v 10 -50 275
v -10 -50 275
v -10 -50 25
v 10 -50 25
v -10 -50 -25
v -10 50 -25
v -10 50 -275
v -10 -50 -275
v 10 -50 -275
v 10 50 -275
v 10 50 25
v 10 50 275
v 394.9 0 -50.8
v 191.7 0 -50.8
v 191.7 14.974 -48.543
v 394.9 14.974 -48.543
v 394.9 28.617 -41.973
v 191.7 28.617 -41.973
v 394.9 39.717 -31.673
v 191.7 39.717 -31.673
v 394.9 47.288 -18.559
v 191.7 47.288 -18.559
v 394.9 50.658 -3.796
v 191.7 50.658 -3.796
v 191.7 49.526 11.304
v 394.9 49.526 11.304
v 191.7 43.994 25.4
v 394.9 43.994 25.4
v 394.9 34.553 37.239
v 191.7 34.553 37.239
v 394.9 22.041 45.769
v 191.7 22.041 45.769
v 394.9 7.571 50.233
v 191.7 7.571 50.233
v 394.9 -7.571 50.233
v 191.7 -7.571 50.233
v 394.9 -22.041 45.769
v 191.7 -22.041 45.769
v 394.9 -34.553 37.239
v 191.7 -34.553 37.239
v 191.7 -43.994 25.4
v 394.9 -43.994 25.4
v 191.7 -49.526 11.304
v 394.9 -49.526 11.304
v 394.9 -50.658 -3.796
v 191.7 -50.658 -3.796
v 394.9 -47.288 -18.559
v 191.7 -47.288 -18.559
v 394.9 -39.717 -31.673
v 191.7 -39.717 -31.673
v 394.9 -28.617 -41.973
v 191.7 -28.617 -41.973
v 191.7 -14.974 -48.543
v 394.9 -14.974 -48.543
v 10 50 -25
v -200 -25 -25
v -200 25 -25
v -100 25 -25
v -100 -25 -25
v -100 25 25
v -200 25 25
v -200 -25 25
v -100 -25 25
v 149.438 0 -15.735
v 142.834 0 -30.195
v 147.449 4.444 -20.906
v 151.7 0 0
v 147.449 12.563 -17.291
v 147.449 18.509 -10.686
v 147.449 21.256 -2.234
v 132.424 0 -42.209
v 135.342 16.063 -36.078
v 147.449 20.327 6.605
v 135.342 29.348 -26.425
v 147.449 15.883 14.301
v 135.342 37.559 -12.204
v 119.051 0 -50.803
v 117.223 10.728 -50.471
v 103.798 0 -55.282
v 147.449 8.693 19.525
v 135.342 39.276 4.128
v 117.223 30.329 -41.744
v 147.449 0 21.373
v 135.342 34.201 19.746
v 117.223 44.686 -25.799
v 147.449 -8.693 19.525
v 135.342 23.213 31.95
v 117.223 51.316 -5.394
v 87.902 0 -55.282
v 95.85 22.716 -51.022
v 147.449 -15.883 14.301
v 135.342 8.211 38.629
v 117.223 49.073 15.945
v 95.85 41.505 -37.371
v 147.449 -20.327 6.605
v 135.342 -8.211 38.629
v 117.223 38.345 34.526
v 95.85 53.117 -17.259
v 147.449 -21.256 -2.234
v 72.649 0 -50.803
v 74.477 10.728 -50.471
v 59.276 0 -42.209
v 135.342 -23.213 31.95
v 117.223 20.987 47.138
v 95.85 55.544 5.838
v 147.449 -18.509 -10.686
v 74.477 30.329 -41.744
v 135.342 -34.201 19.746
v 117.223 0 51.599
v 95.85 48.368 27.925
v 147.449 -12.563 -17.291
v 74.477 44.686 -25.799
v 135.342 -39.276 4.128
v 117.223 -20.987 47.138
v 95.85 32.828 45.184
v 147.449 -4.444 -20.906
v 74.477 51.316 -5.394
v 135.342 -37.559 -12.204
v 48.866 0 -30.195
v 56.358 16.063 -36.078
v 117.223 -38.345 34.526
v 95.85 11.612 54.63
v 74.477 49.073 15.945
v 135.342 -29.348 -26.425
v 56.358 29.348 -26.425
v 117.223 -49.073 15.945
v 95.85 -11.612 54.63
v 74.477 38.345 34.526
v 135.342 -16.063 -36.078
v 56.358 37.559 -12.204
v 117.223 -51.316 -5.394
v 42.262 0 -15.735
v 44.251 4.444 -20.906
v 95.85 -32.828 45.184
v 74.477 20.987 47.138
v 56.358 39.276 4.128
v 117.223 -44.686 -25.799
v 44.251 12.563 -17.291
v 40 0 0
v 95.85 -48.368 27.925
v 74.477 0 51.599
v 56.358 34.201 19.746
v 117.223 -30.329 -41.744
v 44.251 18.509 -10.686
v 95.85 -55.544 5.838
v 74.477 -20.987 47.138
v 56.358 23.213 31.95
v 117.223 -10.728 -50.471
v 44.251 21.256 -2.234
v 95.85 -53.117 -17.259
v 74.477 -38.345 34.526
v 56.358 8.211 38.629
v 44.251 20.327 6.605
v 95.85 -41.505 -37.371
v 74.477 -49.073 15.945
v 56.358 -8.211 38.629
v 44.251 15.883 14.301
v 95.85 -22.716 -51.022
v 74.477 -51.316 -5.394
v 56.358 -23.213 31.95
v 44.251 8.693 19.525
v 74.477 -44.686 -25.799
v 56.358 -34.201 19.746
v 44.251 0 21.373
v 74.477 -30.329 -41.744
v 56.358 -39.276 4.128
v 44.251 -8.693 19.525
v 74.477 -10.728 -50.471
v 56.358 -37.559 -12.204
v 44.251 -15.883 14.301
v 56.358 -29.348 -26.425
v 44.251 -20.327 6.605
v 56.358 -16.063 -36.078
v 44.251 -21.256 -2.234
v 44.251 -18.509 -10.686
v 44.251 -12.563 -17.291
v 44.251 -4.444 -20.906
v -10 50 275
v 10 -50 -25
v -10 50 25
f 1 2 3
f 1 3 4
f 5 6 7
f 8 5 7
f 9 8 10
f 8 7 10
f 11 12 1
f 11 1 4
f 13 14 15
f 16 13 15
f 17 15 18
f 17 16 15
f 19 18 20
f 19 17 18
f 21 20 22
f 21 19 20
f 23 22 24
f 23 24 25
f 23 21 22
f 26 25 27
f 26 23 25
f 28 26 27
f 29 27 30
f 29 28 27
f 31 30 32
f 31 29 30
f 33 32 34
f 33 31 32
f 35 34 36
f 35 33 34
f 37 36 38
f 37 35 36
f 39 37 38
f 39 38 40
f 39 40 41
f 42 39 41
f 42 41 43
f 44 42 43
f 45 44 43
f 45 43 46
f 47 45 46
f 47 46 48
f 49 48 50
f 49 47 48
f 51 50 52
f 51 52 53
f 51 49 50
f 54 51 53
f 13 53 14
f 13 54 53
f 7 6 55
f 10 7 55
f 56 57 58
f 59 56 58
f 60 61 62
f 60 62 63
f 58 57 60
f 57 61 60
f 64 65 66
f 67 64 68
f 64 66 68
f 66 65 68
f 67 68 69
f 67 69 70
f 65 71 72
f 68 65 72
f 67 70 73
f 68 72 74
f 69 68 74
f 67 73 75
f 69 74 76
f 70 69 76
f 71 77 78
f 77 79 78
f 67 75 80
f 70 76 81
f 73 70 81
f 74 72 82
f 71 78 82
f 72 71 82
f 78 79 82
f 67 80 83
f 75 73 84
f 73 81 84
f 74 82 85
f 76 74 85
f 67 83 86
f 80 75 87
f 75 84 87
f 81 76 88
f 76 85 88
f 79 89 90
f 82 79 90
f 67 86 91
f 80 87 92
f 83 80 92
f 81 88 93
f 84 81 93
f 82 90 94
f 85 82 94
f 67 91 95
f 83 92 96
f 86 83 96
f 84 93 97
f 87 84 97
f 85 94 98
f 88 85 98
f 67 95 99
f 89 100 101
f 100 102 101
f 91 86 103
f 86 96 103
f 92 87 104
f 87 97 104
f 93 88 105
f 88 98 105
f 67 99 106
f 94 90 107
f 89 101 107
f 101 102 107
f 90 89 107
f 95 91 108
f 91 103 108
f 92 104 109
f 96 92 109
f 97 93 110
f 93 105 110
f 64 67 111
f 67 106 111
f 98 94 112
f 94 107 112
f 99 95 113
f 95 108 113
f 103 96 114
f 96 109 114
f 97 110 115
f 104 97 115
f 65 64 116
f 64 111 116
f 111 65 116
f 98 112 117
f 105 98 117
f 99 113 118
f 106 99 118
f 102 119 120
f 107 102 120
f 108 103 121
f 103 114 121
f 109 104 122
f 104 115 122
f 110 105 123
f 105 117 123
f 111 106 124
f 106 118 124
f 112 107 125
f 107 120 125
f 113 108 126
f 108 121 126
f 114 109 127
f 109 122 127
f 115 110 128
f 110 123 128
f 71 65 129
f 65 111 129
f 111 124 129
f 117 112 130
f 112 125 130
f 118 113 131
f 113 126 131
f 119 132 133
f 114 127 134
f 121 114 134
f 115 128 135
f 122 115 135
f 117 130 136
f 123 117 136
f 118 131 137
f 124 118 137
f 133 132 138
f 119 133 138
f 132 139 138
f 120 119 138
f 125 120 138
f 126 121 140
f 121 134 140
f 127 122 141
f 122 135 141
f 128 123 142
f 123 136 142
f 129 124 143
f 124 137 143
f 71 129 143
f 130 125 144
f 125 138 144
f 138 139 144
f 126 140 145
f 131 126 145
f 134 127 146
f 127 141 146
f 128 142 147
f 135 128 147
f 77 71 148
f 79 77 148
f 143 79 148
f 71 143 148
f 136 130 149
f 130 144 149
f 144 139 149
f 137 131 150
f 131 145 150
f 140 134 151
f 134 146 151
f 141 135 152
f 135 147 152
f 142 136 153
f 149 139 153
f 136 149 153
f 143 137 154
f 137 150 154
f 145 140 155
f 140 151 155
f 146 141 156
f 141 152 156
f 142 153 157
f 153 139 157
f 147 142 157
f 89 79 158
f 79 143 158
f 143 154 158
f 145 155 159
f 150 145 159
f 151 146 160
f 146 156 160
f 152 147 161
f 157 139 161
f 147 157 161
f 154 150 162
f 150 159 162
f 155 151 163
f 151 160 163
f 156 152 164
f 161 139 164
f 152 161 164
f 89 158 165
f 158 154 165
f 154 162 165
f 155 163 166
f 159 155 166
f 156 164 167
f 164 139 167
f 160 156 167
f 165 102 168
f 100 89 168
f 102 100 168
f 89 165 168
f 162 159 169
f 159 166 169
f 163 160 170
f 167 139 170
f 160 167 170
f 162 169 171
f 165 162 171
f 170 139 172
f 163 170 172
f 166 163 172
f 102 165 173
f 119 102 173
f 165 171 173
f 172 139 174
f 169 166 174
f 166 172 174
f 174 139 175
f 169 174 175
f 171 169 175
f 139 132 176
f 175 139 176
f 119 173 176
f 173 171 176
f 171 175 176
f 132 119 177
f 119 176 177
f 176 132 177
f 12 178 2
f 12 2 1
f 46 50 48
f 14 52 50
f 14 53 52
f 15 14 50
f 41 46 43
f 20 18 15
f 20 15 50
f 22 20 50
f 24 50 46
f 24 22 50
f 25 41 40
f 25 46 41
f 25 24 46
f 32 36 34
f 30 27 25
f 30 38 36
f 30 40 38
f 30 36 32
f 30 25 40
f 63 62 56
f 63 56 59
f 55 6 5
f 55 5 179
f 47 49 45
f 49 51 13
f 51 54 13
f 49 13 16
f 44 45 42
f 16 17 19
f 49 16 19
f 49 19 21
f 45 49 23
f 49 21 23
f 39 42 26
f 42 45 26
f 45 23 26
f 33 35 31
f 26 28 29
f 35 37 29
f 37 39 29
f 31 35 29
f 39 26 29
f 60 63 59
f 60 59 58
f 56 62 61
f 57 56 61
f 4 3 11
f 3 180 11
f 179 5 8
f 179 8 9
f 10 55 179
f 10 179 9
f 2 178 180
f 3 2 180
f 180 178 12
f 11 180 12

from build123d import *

# Parameters (mm, degrees)
SKETCH2_W             = 100
SKETCH2_H             = 50
BOSS_EXTRUDE2_DEPTH   = 25
SKETCH3_W             = 203.2
SKETCH3_H             = 50.8
SKETCH4_W             = 20
SKETCH4_H             = 250
BOSS_EXTRUDE3_DEPTH   = 50
BOSS_EXTRUDE3_2_DEPTH = 50


with BuildPart() as part:
    # Sketch2 → Boss-Extrude2 (new, symmetric)
    with BuildSketch(Plane.XY):
        with Locations((-150, 0)):
            Rectangle(SKETCH2_W, SKETCH2_H)
    extrude(amount=BOSS_EXTRUDE2_DEPTH, both=True)


with BuildPart() as body_2:
    # Sketch3 → Revolve1 (revolve)
    with BuildSketch(Plane(origin=(0, 0, 0), x_dir=(1, 0, 0), z_dir=(0, 1, 0))):
        with BuildLine():
            Line((40, 0), (151.7, 0))
            ThreePointArc((151.7, 0), (95.85, 55.85), (40, 0))
        make_face()
        with Locations((293.3, 25.4)):
            Rectangle(SKETCH3_W, SKETCH3_H)
    revolve(axis=Axis((0, 0, 0), (1, 0, 0)))


with BuildPart() as body_3:
    # Sketch4 → Boss-Extrude3 (new, symmetric)
    with BuildSketch(Plane(origin=(0, 0, 0), x_dir=(1, 0, 0), z_dir=(0, 1, 0))):
        with Locations((0, 150)):
            Rectangle(SKETCH4_W, SKETCH4_H)
    extrude(amount=BOSS_EXTRUDE3_DEPTH, both=True)


with BuildPart() as body_4:
    # Sketch4 → Boss-Extrude3 2 (new, symmetric)
    with BuildSketch(Plane(origin=(0, 0, 0), x_dir=(1, 0, 0), z_dir=(0, 1, 0))):
        with Locations((0, -150)):
            Rectangle(SKETCH4_W, SKETCH4_H)
    extrude(amount=BOSS_EXTRUDE3_2_DEPTH, both=True)


solid = Compound([part.part, body_2.part, body_3.part, body_4.part])
